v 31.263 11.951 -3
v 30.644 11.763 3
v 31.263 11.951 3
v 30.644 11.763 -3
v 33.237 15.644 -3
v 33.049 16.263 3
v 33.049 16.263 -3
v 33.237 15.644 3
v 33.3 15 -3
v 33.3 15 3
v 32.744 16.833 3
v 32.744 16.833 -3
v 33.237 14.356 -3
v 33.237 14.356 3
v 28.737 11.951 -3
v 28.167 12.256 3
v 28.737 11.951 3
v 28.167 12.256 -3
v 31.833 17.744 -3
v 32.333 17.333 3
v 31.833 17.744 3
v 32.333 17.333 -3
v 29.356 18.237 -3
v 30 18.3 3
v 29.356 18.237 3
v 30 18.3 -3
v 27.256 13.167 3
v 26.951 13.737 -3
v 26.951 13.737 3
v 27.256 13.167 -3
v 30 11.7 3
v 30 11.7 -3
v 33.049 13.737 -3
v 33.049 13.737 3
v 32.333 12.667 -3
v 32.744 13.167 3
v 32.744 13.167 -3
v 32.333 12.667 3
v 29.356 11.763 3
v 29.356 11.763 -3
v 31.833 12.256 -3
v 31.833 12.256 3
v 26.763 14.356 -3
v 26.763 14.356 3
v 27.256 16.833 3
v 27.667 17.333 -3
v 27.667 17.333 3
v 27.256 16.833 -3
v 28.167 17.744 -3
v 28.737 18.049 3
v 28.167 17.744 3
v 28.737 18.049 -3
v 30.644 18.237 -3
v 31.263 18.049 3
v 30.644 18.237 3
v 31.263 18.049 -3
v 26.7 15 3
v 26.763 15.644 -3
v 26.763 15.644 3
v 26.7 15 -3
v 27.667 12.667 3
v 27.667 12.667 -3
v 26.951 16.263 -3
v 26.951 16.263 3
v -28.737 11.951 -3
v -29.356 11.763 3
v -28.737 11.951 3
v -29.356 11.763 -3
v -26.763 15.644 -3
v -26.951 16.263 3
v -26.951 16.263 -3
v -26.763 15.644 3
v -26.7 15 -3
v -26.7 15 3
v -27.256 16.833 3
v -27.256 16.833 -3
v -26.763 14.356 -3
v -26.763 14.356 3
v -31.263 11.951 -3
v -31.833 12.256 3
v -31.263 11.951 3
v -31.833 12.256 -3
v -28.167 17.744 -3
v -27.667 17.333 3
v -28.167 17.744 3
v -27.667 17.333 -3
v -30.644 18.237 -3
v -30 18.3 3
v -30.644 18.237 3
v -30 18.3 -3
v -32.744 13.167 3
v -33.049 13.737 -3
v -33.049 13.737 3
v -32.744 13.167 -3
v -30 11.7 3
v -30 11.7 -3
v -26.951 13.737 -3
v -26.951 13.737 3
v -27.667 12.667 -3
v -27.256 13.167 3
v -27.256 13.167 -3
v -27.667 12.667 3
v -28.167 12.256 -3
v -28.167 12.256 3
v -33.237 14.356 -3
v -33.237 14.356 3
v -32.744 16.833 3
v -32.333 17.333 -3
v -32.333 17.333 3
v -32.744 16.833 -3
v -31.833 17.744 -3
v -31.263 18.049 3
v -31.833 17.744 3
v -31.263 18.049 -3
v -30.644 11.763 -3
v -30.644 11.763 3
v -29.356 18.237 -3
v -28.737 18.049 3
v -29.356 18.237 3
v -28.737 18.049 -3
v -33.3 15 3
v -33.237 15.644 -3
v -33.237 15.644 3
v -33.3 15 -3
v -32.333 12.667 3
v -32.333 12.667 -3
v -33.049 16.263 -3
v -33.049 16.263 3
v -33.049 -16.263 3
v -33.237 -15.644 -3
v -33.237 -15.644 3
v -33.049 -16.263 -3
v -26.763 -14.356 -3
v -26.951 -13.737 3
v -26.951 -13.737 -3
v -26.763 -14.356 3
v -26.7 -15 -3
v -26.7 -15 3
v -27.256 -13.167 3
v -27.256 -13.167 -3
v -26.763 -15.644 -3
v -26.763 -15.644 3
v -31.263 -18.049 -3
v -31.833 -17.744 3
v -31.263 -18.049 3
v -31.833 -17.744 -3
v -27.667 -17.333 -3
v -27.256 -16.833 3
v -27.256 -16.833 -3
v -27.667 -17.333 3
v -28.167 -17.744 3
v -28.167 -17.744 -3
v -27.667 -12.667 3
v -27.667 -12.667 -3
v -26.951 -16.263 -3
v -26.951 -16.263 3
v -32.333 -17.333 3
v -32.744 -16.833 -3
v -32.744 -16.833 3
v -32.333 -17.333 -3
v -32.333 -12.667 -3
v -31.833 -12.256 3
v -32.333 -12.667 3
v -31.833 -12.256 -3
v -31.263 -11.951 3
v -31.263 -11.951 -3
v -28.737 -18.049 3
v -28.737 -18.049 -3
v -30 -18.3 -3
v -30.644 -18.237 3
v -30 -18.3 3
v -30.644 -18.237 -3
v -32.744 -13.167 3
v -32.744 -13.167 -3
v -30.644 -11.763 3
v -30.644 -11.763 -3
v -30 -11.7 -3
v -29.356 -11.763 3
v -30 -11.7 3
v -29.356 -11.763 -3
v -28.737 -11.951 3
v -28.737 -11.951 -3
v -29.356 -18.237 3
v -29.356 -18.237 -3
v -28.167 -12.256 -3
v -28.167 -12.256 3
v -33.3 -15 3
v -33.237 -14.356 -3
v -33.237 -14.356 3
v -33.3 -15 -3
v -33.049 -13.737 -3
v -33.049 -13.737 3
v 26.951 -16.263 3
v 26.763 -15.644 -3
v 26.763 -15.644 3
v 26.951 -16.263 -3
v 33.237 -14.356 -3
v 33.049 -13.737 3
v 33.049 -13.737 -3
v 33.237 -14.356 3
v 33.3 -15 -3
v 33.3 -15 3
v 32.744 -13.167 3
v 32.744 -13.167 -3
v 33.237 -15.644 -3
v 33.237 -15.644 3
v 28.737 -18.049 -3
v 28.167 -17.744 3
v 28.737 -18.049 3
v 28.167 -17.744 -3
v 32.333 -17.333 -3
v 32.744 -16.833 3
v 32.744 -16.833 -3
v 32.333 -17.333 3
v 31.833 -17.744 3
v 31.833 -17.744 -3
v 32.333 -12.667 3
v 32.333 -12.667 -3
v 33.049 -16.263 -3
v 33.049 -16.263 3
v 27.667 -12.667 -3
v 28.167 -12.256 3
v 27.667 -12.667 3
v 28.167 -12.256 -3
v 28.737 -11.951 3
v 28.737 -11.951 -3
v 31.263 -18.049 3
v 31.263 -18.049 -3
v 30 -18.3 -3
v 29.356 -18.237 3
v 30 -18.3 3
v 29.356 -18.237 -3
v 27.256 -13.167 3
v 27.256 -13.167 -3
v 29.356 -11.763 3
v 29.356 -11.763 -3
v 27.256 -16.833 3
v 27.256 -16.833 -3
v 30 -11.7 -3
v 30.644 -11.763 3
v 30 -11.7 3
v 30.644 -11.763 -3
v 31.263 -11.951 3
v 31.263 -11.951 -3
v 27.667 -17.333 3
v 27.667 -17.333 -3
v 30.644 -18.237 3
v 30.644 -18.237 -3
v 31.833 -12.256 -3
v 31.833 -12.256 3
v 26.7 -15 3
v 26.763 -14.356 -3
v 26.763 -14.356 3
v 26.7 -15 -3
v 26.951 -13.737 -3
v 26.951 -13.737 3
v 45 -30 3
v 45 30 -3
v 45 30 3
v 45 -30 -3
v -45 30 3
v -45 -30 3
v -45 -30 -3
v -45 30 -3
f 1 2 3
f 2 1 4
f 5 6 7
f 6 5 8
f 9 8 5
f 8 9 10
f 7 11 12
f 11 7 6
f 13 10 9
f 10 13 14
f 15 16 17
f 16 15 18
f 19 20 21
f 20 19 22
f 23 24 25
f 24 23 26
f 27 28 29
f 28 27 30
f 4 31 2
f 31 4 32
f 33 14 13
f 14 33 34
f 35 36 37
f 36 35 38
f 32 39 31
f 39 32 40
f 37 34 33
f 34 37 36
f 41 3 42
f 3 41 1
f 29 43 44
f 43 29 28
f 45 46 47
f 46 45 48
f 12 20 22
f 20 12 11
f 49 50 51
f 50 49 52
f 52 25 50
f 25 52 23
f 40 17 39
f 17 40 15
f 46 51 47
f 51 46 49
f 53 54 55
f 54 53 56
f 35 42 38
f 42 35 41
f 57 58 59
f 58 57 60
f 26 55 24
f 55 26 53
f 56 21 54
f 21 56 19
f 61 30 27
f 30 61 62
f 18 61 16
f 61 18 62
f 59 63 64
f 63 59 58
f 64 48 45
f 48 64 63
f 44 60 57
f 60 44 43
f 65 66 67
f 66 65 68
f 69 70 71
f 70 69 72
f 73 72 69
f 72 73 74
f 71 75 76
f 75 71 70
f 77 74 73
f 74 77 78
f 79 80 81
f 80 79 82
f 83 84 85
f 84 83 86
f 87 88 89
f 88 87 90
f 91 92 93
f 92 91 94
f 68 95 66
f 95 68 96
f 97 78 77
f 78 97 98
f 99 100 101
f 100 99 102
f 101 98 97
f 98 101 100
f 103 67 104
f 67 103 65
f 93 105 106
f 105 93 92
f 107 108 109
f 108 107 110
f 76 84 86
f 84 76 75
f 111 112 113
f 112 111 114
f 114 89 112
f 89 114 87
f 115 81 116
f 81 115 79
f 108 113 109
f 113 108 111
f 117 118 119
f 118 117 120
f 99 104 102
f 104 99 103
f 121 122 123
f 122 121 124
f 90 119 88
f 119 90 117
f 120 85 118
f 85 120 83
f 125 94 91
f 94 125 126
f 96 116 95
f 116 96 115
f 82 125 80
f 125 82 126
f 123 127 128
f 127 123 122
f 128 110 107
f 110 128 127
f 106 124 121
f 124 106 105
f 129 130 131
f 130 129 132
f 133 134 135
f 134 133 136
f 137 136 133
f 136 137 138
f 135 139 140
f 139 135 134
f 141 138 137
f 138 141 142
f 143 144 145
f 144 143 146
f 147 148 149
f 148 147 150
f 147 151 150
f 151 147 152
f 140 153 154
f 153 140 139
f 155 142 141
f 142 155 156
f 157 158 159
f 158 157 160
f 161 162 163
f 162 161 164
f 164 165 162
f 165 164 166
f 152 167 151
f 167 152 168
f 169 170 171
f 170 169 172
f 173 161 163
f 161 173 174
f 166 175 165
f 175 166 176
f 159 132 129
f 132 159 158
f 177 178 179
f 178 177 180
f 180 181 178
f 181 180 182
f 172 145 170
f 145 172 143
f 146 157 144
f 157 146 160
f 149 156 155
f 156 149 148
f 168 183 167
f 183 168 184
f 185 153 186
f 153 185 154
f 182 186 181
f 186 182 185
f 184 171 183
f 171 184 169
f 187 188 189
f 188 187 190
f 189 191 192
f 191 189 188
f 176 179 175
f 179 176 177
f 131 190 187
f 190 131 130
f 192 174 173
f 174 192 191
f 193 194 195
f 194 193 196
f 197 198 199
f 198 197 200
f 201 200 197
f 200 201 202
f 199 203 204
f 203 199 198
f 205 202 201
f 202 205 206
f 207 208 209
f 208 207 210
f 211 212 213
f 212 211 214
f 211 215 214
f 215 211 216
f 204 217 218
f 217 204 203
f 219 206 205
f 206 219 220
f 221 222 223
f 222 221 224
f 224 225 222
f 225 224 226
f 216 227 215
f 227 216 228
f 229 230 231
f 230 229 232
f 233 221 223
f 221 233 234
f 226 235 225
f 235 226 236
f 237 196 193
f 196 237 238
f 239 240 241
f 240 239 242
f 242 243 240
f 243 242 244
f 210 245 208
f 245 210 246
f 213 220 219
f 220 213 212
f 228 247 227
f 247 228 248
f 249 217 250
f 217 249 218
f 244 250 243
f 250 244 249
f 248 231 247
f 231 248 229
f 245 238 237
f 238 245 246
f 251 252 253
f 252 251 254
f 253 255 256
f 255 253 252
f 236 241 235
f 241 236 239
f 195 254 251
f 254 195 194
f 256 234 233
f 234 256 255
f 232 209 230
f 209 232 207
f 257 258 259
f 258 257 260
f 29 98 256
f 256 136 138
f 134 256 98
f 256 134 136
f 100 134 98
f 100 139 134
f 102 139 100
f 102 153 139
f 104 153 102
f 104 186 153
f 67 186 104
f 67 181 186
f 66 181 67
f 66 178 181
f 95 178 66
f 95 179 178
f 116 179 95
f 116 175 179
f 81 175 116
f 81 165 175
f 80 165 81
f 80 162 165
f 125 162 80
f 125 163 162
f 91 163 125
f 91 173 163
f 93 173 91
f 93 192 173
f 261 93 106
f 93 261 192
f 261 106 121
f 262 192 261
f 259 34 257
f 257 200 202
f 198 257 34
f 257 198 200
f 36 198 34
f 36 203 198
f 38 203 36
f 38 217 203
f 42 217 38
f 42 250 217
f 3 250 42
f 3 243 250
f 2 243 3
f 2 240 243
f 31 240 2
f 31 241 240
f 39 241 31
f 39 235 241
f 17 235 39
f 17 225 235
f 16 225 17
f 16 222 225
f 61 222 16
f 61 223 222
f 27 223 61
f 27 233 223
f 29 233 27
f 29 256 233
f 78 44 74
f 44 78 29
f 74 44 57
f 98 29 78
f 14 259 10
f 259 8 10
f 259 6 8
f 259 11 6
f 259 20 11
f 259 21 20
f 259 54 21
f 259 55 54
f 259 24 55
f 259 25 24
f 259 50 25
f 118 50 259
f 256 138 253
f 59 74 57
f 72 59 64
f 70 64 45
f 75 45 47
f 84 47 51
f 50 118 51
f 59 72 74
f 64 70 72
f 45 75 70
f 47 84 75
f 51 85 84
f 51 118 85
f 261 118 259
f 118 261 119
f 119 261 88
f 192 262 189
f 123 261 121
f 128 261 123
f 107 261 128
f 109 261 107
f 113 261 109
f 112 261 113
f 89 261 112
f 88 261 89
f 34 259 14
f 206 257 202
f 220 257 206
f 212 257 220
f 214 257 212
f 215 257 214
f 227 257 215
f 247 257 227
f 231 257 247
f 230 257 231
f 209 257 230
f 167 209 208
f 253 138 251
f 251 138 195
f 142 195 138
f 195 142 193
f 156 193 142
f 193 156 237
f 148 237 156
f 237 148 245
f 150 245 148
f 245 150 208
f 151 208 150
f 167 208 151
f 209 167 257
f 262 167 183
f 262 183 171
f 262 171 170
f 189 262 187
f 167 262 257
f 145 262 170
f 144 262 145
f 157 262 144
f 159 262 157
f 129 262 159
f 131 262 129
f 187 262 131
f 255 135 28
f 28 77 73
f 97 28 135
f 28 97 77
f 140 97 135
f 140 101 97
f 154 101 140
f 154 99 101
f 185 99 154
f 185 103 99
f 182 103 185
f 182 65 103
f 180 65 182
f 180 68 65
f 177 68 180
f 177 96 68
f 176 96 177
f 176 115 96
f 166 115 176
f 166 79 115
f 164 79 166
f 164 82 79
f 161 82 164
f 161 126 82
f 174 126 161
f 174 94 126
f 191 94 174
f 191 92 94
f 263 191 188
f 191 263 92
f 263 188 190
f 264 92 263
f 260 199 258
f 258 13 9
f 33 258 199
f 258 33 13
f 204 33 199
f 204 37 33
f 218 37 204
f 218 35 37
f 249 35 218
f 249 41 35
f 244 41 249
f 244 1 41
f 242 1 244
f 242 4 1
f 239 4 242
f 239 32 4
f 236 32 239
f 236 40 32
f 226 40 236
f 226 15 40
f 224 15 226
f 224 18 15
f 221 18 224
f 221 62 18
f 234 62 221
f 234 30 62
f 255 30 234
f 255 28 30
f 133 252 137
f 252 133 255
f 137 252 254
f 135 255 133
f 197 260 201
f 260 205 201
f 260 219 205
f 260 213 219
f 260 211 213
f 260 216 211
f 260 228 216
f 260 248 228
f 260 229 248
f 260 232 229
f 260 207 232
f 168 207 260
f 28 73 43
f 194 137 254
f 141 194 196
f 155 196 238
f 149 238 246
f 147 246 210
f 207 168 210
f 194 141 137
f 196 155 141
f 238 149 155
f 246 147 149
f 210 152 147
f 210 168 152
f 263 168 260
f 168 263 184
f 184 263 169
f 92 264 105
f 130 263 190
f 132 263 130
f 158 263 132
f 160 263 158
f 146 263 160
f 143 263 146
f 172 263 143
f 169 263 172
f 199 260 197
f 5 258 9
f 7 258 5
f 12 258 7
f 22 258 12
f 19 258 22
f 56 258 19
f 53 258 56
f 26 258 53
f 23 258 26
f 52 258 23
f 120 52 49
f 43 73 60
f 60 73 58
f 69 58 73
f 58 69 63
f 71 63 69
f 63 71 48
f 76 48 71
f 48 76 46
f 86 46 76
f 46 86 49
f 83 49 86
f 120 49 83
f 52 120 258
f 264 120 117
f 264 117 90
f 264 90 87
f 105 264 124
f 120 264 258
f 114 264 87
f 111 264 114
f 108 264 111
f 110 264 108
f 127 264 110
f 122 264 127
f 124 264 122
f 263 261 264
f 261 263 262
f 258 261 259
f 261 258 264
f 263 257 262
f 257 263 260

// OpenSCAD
$fn = 32;

// ----------------------------------------------------------------------
// Corner plate 90 x 60 x 6
// 4 holes, centres taken from the edge offset
// ----------------------------------------------------------------------

// --- parameters (mm) ---
plate = [90, 60, 6];  // overall size (x, y, z)
holes = 4;            // number of holes the drawing asks for
hole_d = 6.6;         // hole diameter
edge = 15;            // hole centre offset from the plate edge

// --- derived feature positions (mm) ---
corner_x = plate[0] / 2 - edge;  // = 30   corner hole X
corner_y = plate[1] / 2 - edge;  // = 15   corner hole Y
feature_centers = [
  [corner_x, corner_y],
  [-corner_x, corner_y],
  [-corner_x, -corner_y],
  [corner_x, -corner_y]
];   // hole centres the loop below drills

// plate outline, every hole drilled through with the same cutters
difference() {
  cube(plate, center = true);
  for (centre = feature_centers)
    translate([centre[0], centre[1], 0])
      cylinder(d = hole_d, h = plate[2] + 2, center = true);
}
